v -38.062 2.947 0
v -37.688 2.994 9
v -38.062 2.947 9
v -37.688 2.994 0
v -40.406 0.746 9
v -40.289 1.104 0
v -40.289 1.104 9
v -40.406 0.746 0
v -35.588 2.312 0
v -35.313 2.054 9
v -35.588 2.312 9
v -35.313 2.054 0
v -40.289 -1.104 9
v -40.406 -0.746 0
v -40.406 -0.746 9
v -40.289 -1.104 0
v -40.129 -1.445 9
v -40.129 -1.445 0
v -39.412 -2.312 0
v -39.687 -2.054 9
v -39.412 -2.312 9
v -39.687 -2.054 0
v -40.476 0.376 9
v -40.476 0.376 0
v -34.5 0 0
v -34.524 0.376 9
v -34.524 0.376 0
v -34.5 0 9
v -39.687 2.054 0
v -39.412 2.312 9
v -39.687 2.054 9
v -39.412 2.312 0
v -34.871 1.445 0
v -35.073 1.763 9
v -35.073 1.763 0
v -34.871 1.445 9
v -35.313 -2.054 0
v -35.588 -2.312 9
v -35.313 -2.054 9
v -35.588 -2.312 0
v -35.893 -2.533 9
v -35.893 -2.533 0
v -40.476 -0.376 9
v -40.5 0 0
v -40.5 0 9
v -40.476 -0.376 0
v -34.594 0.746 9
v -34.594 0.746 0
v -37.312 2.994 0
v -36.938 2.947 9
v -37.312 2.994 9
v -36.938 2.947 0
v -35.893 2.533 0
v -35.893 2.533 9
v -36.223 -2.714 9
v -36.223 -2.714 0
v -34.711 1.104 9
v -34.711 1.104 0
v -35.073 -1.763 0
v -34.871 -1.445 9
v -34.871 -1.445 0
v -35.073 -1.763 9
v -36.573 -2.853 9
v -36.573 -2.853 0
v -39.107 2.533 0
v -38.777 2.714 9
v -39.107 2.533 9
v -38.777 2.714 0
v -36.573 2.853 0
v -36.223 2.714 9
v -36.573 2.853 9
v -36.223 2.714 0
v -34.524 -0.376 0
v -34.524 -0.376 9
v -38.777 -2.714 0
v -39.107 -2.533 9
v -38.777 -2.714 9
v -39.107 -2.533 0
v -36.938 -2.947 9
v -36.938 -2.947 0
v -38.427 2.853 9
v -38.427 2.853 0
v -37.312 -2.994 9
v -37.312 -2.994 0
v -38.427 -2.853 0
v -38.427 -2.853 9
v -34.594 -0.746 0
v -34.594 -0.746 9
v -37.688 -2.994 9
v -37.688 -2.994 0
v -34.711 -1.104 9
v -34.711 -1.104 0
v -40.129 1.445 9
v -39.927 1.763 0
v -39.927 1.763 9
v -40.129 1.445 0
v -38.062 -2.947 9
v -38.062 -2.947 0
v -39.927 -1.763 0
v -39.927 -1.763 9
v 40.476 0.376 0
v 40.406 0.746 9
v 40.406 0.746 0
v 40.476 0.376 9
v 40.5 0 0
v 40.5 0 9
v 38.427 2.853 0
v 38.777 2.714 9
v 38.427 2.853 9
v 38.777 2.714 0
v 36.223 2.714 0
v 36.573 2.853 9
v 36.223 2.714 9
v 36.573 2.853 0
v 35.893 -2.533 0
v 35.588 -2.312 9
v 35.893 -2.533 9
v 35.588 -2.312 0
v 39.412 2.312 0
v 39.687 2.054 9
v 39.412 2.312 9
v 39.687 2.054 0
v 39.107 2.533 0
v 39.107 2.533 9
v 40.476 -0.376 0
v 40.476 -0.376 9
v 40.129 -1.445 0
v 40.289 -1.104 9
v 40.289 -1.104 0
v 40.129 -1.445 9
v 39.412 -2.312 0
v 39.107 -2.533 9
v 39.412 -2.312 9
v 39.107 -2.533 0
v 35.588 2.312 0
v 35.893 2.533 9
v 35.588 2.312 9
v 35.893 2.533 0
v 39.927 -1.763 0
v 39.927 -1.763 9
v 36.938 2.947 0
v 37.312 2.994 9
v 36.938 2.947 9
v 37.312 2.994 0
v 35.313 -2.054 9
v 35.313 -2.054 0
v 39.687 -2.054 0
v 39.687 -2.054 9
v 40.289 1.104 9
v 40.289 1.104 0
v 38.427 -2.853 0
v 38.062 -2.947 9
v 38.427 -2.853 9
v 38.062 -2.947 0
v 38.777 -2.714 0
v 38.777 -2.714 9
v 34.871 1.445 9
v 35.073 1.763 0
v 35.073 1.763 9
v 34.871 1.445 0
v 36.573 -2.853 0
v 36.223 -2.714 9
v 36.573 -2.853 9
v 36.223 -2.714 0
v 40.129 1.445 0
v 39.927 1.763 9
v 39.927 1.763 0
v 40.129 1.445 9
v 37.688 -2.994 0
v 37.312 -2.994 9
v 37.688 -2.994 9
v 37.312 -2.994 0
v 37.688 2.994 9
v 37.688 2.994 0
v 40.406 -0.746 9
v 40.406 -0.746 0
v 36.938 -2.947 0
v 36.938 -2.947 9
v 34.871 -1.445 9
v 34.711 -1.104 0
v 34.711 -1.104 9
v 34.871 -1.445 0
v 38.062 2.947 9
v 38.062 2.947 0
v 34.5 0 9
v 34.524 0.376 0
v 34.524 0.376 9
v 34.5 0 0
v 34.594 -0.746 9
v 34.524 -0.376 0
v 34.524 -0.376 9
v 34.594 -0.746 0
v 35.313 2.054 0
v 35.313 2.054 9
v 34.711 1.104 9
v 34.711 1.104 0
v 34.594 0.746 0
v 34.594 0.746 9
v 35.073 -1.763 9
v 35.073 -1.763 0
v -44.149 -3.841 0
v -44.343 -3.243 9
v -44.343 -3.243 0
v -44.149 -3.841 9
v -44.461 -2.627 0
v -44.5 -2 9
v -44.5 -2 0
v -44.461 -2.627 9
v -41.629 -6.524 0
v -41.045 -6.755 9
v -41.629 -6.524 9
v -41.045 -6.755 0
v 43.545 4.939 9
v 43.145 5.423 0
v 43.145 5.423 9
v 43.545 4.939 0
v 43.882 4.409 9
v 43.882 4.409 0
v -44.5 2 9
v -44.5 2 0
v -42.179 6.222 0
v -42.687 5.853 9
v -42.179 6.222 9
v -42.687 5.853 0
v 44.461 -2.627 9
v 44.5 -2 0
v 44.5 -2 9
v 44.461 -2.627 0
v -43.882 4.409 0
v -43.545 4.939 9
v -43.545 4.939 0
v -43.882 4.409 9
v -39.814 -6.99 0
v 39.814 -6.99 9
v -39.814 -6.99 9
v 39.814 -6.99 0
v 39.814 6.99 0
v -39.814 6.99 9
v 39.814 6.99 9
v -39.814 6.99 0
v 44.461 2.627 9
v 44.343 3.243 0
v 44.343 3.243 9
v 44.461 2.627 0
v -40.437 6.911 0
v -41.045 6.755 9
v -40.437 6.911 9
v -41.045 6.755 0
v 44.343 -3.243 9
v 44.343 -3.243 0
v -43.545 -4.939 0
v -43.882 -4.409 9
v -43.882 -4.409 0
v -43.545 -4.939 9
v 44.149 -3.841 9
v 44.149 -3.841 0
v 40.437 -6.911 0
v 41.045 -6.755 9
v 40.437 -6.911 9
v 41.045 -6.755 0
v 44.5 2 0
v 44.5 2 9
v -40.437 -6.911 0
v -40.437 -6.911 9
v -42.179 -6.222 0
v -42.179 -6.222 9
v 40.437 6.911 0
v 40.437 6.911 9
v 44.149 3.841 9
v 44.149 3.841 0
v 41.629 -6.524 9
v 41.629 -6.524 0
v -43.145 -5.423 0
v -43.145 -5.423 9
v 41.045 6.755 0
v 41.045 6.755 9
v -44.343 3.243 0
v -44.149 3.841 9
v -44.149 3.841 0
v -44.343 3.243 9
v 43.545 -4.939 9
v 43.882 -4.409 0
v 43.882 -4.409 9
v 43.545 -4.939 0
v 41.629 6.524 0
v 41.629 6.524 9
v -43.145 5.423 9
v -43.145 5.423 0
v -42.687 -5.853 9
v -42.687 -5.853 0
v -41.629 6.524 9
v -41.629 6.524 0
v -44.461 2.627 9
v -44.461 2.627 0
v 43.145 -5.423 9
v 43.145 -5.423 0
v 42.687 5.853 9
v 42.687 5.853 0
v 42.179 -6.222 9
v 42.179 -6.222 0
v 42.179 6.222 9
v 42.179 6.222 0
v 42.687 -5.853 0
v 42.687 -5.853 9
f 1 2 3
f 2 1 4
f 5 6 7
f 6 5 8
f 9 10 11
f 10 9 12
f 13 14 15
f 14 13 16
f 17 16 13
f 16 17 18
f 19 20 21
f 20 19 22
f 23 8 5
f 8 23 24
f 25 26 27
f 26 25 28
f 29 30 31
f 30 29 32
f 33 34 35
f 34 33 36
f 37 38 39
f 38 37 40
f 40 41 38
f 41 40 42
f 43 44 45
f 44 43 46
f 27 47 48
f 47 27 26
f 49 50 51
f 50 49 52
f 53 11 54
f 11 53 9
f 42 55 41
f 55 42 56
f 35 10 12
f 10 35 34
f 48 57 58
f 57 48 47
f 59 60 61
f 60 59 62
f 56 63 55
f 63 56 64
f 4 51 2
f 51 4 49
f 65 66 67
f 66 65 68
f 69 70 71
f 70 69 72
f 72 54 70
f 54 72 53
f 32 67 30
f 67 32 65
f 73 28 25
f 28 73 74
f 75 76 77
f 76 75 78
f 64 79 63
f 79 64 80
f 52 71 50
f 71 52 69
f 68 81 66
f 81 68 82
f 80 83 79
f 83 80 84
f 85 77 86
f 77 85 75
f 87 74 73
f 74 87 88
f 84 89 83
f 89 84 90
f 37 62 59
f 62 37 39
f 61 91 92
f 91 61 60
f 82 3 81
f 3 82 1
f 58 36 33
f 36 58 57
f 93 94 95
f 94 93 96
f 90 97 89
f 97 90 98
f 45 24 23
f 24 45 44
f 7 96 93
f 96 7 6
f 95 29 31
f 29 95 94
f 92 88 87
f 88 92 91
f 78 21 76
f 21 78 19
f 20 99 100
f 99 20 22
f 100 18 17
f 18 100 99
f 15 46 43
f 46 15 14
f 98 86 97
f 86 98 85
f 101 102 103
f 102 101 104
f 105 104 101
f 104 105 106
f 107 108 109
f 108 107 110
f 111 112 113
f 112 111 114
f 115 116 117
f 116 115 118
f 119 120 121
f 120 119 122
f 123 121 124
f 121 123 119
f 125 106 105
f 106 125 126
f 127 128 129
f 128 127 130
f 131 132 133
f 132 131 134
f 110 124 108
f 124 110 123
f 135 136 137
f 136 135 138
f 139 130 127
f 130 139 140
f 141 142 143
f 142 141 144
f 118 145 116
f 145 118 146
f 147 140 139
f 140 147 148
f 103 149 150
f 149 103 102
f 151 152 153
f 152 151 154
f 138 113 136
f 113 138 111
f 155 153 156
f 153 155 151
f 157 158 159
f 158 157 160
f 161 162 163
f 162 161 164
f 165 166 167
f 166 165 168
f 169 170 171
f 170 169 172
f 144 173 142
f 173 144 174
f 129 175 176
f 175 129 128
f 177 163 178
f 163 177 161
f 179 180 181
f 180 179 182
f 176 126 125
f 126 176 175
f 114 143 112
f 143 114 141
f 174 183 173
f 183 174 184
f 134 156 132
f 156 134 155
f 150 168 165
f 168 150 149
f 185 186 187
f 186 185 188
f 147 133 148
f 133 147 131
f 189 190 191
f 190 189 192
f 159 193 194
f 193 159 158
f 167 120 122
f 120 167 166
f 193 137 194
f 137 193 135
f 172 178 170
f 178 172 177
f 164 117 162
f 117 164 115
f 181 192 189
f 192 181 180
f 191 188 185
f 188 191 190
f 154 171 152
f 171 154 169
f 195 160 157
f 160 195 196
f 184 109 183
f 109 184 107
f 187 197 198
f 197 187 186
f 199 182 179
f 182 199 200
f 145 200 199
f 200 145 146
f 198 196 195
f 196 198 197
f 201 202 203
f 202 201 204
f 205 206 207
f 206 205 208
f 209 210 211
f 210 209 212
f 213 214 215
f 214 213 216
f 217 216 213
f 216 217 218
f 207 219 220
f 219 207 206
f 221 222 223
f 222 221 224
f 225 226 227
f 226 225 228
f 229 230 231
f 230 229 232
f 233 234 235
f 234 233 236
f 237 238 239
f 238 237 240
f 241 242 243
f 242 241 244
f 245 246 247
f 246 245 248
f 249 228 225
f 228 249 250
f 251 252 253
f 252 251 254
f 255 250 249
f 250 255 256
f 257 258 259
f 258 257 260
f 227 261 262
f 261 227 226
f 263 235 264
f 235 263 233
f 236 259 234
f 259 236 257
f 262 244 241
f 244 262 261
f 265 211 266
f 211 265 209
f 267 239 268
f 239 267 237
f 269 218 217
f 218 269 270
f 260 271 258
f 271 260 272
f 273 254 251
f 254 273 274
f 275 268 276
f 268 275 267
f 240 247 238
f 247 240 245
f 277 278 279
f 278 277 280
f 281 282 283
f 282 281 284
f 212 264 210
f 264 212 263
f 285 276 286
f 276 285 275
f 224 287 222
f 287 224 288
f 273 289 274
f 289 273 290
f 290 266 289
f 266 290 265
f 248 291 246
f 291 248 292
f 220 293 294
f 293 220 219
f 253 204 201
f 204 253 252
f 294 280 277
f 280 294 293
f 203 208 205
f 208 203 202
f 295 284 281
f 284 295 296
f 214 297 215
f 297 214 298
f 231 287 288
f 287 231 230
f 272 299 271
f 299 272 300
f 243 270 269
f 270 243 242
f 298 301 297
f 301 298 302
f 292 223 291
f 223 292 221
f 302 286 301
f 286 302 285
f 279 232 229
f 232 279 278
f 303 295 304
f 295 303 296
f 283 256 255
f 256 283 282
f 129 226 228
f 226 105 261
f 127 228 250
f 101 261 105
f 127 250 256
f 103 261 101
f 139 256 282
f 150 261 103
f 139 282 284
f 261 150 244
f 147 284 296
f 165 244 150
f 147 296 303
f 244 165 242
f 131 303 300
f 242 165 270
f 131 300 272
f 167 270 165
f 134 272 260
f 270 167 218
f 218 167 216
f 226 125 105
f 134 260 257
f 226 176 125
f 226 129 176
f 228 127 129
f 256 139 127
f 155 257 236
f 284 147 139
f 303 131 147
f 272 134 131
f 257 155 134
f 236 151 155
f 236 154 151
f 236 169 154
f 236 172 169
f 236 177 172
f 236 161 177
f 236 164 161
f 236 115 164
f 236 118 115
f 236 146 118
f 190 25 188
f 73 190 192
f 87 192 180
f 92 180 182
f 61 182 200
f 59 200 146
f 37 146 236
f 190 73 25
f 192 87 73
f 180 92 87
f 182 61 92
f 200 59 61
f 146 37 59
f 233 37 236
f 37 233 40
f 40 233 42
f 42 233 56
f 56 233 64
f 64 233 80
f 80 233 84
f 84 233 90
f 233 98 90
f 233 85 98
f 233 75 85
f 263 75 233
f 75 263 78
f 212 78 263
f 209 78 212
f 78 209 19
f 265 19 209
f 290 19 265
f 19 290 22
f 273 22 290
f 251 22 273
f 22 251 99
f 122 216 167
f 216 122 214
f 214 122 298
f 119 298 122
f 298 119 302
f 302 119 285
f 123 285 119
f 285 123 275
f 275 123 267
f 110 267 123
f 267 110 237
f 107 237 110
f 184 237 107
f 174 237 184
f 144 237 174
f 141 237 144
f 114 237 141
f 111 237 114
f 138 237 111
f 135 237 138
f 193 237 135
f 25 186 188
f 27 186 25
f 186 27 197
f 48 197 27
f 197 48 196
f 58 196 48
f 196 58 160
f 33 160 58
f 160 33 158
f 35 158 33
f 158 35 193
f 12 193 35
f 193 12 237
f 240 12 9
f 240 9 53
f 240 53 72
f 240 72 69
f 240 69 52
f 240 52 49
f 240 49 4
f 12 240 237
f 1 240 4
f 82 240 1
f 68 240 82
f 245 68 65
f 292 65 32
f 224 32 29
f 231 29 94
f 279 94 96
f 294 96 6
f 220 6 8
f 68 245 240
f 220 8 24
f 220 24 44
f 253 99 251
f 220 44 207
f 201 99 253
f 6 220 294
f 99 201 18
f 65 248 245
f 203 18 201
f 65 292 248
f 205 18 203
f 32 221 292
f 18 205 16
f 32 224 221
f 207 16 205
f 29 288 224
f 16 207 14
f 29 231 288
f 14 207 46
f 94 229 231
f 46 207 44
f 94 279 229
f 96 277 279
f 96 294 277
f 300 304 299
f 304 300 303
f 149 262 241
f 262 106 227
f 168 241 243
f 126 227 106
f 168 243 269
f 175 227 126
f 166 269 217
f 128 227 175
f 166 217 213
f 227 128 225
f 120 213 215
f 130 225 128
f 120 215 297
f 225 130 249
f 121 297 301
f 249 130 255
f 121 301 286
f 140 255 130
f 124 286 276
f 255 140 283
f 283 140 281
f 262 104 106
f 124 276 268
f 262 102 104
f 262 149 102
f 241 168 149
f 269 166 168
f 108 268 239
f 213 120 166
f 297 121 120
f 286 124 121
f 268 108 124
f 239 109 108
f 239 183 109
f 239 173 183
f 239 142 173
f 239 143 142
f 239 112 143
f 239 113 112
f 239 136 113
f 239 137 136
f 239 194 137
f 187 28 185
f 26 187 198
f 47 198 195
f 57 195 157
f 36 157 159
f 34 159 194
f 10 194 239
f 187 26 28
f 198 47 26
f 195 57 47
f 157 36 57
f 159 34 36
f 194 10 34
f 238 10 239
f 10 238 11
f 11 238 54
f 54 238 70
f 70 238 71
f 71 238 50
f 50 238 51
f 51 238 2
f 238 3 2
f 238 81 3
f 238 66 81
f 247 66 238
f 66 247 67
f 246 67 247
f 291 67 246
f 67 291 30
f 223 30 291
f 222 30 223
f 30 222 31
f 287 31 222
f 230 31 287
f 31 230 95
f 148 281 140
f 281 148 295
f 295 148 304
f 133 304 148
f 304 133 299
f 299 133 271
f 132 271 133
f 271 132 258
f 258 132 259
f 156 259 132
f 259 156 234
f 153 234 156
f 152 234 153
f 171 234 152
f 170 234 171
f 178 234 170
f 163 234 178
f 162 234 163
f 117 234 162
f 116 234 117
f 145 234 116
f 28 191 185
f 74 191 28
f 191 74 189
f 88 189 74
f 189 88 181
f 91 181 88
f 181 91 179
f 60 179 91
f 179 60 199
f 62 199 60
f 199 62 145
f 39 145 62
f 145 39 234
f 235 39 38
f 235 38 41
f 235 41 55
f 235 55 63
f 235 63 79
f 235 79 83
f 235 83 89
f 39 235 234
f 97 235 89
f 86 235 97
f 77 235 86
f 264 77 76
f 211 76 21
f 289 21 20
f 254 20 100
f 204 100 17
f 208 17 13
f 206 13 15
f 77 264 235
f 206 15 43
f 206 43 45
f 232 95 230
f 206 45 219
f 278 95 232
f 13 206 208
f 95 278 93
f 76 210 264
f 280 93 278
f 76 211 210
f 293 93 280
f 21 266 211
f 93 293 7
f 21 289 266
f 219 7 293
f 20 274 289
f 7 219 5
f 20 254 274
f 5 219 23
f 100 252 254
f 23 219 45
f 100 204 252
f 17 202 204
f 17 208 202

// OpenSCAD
$fn = 50;


difference() {
	union() {
		hull() {
			translate(v = [-39.5000000000, 2.0000000000, 0]) {
				cylinder(h = 9, r = 5);
			}
			translate(v = [39.5000000000, 2.0000000000, 0]) {
				cylinder(h = 9, r = 5);
			}
			translate(v = [-39.5000000000, -2.0000000000, 0]) {
				cylinder(h = 9, r = 5);
			}
			translate(v = [39.5000000000, -2.0000000000, 0]) {
				cylinder(h = 9, r = 5);
			}
		}
	}
	union() {
		translate(v = [-37.5000000000, 0.0000000000, -100.0000000000]) {
			cylinder(h = 200, r = 3.0000000000);
		}
		translate(v = [-37.5000000000, 0.0000000000, -100.0000000000]) {
			cylinder(h = 200, r = 3.0000000000);
		}
		translate(v = [37.5000000000, 0.0000000000, -100.0000000000]) {
			cylinder(h = 200, r = 3.0000000000);
		}
		translate(v = [37.5000000000, 0.0000000000, -100.0000000000]) {
			cylinder(h = 200, r = 3.0000000000);
		}
	}
}
